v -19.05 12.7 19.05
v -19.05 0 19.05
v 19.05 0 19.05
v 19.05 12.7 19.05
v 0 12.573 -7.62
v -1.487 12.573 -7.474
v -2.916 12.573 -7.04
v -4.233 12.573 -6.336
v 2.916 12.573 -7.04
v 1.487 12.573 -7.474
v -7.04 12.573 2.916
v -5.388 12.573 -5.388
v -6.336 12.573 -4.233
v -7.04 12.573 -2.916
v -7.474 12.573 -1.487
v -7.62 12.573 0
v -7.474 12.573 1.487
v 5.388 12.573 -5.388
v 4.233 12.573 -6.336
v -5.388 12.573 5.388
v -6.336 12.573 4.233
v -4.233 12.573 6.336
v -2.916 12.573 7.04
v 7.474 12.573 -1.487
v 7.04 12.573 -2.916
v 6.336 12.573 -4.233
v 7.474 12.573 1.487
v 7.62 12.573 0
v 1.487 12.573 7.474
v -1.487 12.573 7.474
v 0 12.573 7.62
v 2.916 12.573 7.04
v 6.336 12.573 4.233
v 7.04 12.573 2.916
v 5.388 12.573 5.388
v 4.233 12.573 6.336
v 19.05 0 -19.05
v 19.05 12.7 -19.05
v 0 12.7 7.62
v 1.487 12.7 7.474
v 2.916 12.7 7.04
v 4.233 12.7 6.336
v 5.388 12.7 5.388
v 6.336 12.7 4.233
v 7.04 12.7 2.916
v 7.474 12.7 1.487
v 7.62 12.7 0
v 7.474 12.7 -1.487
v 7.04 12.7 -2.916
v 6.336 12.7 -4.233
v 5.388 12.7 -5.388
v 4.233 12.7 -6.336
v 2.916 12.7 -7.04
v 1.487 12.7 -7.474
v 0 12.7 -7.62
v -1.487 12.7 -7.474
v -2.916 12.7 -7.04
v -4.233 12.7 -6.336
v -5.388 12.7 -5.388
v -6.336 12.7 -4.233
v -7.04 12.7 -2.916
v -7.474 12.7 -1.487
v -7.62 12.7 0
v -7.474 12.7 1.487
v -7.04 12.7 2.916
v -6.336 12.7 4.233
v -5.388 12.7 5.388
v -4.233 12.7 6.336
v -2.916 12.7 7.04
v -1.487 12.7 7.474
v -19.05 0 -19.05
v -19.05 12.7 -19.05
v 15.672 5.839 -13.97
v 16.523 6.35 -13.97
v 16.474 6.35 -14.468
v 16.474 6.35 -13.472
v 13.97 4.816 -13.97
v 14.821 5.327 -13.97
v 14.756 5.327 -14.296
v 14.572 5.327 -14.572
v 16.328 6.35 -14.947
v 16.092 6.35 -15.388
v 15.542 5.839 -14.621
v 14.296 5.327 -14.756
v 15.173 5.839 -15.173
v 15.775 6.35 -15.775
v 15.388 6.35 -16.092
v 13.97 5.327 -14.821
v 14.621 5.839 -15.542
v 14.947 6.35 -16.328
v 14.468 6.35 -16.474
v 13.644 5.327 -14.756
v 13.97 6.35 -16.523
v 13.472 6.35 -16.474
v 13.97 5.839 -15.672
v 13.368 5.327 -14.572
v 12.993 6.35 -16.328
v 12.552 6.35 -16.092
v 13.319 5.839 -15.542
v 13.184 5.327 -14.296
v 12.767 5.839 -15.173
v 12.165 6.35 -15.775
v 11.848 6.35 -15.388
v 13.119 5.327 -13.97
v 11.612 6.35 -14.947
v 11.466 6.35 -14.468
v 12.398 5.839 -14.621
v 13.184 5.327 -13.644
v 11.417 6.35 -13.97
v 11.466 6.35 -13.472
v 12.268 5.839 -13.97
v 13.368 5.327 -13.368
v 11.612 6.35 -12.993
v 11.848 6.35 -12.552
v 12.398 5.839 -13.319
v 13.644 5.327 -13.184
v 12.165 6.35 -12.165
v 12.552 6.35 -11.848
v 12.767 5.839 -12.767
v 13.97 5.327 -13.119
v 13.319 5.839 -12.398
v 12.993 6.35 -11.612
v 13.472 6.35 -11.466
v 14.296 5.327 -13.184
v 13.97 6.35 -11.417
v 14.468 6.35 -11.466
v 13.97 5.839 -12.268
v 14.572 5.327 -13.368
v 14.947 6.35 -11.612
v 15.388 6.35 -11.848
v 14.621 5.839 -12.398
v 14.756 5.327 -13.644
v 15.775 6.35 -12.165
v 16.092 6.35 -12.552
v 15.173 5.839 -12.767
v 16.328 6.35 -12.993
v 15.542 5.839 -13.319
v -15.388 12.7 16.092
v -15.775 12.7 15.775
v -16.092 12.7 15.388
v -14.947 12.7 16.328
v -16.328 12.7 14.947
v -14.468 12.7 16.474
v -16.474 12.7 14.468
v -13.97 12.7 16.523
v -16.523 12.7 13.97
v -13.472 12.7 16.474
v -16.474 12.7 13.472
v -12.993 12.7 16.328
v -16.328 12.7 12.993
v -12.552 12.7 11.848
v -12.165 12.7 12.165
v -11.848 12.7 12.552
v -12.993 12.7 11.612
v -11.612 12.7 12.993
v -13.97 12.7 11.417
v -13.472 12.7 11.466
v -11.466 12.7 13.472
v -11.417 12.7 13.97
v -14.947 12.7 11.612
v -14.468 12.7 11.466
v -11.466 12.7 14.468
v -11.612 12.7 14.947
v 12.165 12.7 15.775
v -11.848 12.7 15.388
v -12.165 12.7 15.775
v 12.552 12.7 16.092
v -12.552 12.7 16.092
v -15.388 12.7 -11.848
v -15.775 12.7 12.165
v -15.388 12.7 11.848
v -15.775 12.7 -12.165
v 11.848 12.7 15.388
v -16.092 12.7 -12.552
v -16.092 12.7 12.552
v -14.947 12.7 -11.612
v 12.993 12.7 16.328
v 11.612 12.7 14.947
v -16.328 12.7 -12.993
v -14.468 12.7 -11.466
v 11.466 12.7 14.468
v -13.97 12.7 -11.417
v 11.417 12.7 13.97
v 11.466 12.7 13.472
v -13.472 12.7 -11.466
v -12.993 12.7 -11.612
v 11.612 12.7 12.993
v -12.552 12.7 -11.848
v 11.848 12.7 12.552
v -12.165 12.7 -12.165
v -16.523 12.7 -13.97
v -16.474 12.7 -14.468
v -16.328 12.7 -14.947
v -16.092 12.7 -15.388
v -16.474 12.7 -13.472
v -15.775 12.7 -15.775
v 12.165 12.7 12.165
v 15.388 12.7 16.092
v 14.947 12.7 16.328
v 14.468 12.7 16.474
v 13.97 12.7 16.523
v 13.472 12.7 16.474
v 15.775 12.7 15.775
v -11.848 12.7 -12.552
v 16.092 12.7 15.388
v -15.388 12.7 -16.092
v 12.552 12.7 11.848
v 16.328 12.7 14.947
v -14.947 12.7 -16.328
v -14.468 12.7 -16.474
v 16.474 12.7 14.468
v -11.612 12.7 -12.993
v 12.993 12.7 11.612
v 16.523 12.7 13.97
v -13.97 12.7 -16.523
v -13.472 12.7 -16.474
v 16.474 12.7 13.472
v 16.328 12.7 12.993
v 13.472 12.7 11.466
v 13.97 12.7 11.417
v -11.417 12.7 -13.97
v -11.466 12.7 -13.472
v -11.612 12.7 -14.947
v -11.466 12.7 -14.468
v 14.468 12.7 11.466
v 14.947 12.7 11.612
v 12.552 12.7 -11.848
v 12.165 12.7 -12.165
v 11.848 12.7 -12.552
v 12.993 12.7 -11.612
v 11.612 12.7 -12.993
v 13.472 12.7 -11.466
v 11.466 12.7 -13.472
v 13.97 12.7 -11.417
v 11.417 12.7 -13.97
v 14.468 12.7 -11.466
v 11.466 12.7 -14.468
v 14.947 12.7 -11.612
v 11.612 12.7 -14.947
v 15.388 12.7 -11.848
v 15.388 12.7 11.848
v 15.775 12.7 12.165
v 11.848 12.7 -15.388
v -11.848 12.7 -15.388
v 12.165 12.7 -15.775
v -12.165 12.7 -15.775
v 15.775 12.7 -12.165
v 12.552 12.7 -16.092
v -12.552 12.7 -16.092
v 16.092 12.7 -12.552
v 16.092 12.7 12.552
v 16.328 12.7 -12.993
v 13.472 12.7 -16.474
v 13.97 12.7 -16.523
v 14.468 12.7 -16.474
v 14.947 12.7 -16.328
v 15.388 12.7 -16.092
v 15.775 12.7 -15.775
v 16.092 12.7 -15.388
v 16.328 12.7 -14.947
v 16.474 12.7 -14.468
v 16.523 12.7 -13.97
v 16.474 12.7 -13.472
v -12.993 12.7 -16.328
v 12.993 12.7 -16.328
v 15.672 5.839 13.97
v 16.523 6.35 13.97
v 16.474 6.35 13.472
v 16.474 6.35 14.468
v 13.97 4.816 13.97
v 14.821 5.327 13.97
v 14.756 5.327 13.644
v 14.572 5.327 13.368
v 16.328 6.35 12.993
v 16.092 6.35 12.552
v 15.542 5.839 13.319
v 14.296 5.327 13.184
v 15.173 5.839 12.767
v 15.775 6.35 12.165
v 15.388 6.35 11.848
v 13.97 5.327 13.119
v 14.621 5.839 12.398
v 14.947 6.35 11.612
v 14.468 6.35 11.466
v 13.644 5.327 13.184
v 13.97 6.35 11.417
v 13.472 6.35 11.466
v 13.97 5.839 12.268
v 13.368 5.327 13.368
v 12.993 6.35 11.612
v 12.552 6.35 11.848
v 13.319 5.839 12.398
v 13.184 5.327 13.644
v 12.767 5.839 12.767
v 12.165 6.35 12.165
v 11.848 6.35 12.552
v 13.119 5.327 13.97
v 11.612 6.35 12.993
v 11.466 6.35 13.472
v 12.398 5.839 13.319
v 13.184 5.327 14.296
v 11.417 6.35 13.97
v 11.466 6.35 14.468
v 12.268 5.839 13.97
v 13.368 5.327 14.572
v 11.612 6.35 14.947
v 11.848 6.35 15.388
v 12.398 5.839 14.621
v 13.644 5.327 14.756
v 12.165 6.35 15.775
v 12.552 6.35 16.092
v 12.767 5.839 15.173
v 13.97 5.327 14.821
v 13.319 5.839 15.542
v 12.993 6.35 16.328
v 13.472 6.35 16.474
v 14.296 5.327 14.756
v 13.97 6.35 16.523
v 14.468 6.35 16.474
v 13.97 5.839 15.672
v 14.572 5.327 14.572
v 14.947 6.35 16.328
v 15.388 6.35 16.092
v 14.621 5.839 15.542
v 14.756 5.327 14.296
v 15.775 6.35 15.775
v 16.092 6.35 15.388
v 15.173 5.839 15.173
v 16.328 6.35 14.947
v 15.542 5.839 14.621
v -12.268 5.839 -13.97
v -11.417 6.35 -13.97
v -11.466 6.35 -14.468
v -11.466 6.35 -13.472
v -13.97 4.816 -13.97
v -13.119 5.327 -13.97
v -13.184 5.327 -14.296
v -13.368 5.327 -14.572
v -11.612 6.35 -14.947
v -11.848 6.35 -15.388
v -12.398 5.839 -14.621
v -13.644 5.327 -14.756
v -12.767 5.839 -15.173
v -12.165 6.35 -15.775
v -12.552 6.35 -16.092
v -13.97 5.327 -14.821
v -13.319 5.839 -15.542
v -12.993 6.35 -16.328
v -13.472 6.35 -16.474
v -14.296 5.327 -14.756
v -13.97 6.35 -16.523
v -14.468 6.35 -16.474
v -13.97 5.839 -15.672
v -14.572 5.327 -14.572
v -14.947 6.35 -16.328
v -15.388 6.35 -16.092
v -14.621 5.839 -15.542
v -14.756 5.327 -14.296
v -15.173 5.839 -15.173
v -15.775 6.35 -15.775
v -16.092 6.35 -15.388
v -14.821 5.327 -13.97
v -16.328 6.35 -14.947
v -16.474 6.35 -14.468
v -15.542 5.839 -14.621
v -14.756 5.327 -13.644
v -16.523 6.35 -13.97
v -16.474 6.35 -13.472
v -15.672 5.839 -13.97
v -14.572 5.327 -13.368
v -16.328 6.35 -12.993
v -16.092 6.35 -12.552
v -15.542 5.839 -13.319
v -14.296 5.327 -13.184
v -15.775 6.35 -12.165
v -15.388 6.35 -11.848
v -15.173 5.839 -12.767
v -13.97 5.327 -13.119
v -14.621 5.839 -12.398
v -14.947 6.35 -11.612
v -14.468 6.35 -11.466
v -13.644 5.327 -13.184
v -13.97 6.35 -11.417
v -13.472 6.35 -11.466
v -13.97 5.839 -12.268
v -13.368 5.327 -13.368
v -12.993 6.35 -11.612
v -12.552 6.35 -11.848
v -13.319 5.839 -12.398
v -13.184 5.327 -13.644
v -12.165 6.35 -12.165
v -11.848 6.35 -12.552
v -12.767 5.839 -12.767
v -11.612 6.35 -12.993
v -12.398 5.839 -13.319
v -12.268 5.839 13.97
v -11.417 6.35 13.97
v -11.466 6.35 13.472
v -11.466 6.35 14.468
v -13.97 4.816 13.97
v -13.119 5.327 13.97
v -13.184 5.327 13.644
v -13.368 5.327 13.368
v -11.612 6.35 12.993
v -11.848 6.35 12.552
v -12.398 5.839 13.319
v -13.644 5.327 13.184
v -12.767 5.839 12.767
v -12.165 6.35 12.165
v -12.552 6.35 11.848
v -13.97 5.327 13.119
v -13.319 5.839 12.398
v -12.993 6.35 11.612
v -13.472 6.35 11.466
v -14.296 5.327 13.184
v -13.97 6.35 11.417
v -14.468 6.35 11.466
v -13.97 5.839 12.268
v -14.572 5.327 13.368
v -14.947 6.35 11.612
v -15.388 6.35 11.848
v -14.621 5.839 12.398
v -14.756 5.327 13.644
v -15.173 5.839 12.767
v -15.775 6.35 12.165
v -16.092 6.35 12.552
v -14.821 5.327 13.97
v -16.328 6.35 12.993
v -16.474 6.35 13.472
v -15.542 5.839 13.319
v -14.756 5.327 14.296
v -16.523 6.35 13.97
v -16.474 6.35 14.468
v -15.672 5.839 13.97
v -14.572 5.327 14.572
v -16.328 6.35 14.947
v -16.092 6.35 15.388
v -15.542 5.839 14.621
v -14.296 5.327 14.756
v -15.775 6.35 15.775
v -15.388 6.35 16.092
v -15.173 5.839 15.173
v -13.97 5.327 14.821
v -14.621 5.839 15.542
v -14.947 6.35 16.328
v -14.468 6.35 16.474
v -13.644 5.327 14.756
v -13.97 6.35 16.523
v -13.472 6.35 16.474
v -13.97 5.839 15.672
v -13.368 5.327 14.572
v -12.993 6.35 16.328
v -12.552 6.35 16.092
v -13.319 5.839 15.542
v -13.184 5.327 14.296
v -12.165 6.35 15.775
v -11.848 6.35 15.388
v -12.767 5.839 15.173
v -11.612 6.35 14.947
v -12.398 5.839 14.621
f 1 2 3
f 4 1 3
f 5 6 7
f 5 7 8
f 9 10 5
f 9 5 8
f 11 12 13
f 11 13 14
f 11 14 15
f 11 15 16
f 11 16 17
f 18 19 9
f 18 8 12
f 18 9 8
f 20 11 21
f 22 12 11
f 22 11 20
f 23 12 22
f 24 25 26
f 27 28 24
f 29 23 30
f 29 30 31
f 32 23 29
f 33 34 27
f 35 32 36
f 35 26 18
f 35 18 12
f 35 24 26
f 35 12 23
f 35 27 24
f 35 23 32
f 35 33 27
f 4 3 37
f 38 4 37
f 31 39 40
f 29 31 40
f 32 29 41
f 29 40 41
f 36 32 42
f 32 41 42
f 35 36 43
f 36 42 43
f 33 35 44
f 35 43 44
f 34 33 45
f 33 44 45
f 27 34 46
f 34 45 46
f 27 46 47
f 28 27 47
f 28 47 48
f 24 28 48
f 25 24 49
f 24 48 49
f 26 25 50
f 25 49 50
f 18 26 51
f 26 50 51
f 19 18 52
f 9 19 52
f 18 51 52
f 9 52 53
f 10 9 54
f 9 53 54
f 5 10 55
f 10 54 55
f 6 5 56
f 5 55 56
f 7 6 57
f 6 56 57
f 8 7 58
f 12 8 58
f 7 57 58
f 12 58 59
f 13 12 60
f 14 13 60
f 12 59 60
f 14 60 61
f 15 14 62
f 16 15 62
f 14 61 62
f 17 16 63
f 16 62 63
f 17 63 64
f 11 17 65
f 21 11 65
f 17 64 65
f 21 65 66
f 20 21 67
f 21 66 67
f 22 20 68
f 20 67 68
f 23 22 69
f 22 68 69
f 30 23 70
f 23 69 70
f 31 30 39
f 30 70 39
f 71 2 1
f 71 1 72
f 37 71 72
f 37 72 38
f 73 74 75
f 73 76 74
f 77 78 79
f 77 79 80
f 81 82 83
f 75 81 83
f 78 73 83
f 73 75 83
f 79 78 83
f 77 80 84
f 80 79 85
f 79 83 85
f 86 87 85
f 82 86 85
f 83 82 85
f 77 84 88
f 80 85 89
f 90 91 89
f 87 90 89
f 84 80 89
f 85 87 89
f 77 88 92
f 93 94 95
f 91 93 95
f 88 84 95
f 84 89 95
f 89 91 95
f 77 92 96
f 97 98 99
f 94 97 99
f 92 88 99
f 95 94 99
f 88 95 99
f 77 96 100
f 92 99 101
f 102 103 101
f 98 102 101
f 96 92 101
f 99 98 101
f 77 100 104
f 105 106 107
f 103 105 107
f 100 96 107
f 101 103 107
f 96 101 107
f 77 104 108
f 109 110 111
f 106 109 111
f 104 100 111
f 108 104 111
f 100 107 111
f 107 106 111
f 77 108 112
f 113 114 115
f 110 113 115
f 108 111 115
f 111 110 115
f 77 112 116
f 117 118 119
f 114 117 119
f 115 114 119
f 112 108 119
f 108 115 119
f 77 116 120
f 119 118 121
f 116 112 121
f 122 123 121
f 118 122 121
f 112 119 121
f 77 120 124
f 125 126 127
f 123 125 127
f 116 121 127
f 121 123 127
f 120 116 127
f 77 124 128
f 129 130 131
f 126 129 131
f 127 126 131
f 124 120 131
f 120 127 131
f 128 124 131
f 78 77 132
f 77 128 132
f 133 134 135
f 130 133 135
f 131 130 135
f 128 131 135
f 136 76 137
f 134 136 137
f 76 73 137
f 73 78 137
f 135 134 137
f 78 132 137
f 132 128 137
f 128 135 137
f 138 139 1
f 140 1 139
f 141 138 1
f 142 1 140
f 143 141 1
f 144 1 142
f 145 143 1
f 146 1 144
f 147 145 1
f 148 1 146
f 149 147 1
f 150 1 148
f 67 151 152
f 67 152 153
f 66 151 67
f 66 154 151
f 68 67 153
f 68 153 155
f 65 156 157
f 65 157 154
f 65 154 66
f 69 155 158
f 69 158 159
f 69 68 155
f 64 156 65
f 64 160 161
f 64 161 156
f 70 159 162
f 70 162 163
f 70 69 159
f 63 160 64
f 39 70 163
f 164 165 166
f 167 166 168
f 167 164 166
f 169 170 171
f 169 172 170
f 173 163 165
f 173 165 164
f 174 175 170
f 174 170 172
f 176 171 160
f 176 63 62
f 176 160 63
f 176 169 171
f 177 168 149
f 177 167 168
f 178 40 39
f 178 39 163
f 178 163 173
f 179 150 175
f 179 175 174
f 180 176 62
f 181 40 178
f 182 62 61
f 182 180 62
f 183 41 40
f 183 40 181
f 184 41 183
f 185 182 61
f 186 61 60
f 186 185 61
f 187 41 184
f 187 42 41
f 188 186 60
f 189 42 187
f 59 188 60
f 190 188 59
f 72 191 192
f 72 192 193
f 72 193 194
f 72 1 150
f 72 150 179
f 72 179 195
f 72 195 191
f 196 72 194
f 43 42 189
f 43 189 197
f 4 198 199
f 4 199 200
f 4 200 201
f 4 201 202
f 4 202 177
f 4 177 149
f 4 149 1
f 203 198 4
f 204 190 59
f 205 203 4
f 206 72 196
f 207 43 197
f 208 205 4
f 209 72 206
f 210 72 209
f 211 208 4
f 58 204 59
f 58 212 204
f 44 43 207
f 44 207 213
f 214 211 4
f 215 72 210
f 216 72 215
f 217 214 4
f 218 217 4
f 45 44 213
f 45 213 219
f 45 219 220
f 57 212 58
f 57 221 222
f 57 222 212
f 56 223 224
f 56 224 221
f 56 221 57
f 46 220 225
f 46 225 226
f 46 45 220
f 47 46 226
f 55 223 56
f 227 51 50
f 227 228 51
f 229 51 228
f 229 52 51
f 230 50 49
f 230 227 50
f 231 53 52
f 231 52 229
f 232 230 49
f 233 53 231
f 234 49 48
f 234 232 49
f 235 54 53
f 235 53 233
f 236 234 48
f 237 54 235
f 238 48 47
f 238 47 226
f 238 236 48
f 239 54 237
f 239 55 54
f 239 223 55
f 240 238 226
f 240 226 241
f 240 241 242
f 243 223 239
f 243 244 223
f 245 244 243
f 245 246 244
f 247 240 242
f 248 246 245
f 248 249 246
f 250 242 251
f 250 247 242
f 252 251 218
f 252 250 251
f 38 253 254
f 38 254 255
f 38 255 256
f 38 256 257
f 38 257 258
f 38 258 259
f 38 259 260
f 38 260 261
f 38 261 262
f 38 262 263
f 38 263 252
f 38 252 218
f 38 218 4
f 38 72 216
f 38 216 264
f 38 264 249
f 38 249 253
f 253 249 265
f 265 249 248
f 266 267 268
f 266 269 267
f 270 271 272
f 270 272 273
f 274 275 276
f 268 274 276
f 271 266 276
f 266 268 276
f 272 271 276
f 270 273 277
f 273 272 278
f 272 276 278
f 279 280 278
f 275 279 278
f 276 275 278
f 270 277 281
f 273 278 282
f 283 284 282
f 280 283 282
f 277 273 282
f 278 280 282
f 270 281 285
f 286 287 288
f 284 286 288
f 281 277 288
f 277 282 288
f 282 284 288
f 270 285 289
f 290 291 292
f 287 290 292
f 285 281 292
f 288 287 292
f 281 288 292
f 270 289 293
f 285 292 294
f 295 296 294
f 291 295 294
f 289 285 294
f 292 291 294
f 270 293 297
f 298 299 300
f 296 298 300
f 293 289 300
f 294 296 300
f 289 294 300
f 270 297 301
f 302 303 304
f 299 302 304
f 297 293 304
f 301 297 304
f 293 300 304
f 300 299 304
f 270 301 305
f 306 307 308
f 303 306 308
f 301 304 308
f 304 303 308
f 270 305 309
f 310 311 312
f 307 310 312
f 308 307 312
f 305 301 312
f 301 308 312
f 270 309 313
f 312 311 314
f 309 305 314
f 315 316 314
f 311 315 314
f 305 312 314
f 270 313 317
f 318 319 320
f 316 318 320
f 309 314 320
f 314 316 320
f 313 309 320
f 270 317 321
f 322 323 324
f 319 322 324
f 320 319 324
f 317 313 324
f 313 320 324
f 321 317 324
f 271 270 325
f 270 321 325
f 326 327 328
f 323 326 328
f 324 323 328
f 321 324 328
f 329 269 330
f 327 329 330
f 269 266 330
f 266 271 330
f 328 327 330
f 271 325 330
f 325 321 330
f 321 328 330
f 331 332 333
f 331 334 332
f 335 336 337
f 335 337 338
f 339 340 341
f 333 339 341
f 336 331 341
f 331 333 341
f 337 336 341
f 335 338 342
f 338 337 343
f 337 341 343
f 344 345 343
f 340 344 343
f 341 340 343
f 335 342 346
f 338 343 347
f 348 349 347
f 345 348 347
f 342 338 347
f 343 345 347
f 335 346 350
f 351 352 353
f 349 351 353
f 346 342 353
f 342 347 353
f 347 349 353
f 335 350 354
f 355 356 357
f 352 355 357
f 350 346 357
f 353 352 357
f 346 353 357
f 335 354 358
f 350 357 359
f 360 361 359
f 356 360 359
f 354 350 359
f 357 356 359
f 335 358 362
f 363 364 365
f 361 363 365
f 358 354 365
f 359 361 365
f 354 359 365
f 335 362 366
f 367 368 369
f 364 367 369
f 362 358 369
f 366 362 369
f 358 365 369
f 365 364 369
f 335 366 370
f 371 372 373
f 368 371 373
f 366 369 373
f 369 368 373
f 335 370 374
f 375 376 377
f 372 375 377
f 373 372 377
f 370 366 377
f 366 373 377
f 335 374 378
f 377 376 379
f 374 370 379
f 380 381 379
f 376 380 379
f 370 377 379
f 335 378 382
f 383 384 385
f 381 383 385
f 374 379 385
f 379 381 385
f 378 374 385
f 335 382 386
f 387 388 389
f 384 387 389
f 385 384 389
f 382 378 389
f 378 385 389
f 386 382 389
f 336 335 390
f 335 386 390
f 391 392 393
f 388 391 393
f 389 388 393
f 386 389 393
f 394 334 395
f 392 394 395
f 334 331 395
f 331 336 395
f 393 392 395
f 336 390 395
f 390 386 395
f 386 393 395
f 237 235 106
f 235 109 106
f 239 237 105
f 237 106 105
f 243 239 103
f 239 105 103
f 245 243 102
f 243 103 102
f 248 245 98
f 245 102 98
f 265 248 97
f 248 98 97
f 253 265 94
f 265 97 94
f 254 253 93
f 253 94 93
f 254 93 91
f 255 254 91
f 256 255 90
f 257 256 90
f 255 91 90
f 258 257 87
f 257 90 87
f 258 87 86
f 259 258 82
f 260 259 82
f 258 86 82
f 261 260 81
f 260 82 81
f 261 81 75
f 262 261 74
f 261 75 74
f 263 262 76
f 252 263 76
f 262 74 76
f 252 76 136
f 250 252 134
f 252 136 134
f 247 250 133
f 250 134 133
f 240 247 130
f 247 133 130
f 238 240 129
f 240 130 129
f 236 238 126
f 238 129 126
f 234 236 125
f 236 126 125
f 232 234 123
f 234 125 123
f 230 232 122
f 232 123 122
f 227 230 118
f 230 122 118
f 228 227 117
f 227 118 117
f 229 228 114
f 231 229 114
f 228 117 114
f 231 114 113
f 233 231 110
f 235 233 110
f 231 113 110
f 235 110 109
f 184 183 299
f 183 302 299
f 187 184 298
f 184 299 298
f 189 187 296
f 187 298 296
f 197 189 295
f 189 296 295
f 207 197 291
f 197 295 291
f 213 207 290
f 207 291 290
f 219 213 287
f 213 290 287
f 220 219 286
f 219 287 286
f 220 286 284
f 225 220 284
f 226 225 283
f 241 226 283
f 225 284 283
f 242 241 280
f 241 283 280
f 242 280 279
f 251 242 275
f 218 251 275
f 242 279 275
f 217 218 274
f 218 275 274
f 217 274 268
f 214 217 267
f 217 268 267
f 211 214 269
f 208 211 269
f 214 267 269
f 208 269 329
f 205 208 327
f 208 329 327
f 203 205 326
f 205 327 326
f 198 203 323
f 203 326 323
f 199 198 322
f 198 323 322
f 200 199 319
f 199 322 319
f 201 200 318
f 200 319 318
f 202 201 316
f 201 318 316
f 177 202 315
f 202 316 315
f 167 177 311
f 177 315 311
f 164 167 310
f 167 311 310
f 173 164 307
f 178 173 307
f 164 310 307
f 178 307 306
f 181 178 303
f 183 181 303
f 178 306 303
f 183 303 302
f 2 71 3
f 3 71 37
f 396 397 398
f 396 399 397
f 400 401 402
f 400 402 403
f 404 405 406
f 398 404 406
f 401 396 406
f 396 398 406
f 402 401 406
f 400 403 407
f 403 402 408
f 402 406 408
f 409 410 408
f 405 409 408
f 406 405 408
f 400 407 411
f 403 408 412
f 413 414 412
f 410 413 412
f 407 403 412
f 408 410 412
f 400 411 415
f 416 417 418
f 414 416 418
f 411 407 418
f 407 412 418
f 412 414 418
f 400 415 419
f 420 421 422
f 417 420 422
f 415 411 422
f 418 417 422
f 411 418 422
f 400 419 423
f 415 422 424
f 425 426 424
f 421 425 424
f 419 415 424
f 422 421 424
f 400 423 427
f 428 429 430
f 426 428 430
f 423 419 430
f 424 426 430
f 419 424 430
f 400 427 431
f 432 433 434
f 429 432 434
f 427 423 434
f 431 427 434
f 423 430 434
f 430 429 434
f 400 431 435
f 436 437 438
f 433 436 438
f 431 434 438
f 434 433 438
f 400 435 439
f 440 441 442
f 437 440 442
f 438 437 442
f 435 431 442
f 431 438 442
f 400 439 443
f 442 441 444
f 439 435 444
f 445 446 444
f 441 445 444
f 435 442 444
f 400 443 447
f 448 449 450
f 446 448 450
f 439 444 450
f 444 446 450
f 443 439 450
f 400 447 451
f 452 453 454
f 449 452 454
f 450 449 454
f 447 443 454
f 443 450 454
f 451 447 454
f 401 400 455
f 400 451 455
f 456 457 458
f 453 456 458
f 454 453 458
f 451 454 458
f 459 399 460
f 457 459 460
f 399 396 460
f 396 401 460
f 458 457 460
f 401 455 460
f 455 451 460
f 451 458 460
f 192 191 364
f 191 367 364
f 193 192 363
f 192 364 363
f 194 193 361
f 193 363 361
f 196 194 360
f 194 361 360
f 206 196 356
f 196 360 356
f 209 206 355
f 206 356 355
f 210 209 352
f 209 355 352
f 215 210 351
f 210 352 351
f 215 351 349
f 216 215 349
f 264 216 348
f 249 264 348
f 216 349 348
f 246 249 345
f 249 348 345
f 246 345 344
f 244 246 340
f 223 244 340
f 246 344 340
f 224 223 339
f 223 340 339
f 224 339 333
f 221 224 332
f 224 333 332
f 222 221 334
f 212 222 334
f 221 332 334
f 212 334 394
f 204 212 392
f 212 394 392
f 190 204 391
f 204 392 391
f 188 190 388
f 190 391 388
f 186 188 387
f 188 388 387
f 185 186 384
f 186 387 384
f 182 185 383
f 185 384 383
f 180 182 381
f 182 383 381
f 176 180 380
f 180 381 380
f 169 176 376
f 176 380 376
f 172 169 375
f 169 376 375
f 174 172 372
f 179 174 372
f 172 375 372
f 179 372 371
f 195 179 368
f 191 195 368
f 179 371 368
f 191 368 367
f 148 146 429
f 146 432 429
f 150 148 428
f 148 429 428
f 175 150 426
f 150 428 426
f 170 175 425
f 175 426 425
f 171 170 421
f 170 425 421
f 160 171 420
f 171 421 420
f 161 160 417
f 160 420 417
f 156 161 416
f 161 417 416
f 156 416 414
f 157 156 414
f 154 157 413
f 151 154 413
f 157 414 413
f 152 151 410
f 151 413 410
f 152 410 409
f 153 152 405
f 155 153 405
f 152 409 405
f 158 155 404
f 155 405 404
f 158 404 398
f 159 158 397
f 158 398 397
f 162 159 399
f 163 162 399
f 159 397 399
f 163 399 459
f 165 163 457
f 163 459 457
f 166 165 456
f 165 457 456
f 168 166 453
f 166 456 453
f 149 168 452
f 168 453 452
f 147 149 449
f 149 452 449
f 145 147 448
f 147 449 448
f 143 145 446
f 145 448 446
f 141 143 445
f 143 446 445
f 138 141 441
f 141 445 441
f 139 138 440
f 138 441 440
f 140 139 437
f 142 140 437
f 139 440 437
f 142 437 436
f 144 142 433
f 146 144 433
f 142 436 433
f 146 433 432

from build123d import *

# Parameters (mm, degrees)
SKETCH1_W                       = 38.1
SKETCH1_H                       = 38.1
BOSS_EXTRUDE1_DEPTH             = 12.7
SKETCH2_R                       = 7.62
CUT_EXTRUDE1_DEPTH              = 0.127
TAP_DRILL_FOR_1_4_20_TAP2_D     = 5.1054
TAP_DRILL_FOR_1_4_20_TAP2_DEPTH = 6.35
TAP_DRILL_FOR_1_4_20_TAP2_TIP   = 1.533816902


with BuildPart() as part:
    # Sketch1 → Boss-Extrude1 (new body)
    with BuildSketch(Plane(origin=(0, 0, 0), x_dir=(1, 0, 0), z_dir=(0, 1, 0))):
        Rectangle(SKETCH1_W, SKETCH1_H)
    extrude(amount=BOSS_EXTRUDE1_DEPTH)

    # Sketch2 → Cut-Extrude1 (cut)
    with BuildSketch(Plane(origin=(0, 12.7, 0), x_dir=(1, 0, 0), z_dir=(0, 1, 0))):
        with Locations(Location((0, 0, 0), (0, 0, 270))):
            Circle(SKETCH2_R)
    extrude(amount=-CUT_EXTRUDE1_DEPTH, mode=Mode.SUBTRACT)

    # Tap Drill for 1/4-20 Tap2
    with Locations(Plane(origin=(0, 12.7, 0), x_dir=(1, 0, 0), z_dir=(0, 1, 0))):
        with Locations((-13.97, 13.97), (13.97, 13.97), (13.97, -13.97), (-13.97, -13.97)):
            Hole(TAP_DRILL_FOR_1_4_20_TAP2_D / 2, depth=TAP_DRILL_FOR_1_4_20_TAP2_DEPTH)
            with Locations((0, 0, -(TAP_DRILL_FOR_1_4_20_TAP2_DEPTH + TAP_DRILL_FOR_1_4_20_TAP2_TIP / 2))):  # 118° drill point
                Cone(0, TAP_DRILL_FOR_1_4_20_TAP2_D / 2, TAP_DRILL_FOR_1_4_20_TAP2_TIP, mode=Mode.SUBTRACT)


solid = part.part
